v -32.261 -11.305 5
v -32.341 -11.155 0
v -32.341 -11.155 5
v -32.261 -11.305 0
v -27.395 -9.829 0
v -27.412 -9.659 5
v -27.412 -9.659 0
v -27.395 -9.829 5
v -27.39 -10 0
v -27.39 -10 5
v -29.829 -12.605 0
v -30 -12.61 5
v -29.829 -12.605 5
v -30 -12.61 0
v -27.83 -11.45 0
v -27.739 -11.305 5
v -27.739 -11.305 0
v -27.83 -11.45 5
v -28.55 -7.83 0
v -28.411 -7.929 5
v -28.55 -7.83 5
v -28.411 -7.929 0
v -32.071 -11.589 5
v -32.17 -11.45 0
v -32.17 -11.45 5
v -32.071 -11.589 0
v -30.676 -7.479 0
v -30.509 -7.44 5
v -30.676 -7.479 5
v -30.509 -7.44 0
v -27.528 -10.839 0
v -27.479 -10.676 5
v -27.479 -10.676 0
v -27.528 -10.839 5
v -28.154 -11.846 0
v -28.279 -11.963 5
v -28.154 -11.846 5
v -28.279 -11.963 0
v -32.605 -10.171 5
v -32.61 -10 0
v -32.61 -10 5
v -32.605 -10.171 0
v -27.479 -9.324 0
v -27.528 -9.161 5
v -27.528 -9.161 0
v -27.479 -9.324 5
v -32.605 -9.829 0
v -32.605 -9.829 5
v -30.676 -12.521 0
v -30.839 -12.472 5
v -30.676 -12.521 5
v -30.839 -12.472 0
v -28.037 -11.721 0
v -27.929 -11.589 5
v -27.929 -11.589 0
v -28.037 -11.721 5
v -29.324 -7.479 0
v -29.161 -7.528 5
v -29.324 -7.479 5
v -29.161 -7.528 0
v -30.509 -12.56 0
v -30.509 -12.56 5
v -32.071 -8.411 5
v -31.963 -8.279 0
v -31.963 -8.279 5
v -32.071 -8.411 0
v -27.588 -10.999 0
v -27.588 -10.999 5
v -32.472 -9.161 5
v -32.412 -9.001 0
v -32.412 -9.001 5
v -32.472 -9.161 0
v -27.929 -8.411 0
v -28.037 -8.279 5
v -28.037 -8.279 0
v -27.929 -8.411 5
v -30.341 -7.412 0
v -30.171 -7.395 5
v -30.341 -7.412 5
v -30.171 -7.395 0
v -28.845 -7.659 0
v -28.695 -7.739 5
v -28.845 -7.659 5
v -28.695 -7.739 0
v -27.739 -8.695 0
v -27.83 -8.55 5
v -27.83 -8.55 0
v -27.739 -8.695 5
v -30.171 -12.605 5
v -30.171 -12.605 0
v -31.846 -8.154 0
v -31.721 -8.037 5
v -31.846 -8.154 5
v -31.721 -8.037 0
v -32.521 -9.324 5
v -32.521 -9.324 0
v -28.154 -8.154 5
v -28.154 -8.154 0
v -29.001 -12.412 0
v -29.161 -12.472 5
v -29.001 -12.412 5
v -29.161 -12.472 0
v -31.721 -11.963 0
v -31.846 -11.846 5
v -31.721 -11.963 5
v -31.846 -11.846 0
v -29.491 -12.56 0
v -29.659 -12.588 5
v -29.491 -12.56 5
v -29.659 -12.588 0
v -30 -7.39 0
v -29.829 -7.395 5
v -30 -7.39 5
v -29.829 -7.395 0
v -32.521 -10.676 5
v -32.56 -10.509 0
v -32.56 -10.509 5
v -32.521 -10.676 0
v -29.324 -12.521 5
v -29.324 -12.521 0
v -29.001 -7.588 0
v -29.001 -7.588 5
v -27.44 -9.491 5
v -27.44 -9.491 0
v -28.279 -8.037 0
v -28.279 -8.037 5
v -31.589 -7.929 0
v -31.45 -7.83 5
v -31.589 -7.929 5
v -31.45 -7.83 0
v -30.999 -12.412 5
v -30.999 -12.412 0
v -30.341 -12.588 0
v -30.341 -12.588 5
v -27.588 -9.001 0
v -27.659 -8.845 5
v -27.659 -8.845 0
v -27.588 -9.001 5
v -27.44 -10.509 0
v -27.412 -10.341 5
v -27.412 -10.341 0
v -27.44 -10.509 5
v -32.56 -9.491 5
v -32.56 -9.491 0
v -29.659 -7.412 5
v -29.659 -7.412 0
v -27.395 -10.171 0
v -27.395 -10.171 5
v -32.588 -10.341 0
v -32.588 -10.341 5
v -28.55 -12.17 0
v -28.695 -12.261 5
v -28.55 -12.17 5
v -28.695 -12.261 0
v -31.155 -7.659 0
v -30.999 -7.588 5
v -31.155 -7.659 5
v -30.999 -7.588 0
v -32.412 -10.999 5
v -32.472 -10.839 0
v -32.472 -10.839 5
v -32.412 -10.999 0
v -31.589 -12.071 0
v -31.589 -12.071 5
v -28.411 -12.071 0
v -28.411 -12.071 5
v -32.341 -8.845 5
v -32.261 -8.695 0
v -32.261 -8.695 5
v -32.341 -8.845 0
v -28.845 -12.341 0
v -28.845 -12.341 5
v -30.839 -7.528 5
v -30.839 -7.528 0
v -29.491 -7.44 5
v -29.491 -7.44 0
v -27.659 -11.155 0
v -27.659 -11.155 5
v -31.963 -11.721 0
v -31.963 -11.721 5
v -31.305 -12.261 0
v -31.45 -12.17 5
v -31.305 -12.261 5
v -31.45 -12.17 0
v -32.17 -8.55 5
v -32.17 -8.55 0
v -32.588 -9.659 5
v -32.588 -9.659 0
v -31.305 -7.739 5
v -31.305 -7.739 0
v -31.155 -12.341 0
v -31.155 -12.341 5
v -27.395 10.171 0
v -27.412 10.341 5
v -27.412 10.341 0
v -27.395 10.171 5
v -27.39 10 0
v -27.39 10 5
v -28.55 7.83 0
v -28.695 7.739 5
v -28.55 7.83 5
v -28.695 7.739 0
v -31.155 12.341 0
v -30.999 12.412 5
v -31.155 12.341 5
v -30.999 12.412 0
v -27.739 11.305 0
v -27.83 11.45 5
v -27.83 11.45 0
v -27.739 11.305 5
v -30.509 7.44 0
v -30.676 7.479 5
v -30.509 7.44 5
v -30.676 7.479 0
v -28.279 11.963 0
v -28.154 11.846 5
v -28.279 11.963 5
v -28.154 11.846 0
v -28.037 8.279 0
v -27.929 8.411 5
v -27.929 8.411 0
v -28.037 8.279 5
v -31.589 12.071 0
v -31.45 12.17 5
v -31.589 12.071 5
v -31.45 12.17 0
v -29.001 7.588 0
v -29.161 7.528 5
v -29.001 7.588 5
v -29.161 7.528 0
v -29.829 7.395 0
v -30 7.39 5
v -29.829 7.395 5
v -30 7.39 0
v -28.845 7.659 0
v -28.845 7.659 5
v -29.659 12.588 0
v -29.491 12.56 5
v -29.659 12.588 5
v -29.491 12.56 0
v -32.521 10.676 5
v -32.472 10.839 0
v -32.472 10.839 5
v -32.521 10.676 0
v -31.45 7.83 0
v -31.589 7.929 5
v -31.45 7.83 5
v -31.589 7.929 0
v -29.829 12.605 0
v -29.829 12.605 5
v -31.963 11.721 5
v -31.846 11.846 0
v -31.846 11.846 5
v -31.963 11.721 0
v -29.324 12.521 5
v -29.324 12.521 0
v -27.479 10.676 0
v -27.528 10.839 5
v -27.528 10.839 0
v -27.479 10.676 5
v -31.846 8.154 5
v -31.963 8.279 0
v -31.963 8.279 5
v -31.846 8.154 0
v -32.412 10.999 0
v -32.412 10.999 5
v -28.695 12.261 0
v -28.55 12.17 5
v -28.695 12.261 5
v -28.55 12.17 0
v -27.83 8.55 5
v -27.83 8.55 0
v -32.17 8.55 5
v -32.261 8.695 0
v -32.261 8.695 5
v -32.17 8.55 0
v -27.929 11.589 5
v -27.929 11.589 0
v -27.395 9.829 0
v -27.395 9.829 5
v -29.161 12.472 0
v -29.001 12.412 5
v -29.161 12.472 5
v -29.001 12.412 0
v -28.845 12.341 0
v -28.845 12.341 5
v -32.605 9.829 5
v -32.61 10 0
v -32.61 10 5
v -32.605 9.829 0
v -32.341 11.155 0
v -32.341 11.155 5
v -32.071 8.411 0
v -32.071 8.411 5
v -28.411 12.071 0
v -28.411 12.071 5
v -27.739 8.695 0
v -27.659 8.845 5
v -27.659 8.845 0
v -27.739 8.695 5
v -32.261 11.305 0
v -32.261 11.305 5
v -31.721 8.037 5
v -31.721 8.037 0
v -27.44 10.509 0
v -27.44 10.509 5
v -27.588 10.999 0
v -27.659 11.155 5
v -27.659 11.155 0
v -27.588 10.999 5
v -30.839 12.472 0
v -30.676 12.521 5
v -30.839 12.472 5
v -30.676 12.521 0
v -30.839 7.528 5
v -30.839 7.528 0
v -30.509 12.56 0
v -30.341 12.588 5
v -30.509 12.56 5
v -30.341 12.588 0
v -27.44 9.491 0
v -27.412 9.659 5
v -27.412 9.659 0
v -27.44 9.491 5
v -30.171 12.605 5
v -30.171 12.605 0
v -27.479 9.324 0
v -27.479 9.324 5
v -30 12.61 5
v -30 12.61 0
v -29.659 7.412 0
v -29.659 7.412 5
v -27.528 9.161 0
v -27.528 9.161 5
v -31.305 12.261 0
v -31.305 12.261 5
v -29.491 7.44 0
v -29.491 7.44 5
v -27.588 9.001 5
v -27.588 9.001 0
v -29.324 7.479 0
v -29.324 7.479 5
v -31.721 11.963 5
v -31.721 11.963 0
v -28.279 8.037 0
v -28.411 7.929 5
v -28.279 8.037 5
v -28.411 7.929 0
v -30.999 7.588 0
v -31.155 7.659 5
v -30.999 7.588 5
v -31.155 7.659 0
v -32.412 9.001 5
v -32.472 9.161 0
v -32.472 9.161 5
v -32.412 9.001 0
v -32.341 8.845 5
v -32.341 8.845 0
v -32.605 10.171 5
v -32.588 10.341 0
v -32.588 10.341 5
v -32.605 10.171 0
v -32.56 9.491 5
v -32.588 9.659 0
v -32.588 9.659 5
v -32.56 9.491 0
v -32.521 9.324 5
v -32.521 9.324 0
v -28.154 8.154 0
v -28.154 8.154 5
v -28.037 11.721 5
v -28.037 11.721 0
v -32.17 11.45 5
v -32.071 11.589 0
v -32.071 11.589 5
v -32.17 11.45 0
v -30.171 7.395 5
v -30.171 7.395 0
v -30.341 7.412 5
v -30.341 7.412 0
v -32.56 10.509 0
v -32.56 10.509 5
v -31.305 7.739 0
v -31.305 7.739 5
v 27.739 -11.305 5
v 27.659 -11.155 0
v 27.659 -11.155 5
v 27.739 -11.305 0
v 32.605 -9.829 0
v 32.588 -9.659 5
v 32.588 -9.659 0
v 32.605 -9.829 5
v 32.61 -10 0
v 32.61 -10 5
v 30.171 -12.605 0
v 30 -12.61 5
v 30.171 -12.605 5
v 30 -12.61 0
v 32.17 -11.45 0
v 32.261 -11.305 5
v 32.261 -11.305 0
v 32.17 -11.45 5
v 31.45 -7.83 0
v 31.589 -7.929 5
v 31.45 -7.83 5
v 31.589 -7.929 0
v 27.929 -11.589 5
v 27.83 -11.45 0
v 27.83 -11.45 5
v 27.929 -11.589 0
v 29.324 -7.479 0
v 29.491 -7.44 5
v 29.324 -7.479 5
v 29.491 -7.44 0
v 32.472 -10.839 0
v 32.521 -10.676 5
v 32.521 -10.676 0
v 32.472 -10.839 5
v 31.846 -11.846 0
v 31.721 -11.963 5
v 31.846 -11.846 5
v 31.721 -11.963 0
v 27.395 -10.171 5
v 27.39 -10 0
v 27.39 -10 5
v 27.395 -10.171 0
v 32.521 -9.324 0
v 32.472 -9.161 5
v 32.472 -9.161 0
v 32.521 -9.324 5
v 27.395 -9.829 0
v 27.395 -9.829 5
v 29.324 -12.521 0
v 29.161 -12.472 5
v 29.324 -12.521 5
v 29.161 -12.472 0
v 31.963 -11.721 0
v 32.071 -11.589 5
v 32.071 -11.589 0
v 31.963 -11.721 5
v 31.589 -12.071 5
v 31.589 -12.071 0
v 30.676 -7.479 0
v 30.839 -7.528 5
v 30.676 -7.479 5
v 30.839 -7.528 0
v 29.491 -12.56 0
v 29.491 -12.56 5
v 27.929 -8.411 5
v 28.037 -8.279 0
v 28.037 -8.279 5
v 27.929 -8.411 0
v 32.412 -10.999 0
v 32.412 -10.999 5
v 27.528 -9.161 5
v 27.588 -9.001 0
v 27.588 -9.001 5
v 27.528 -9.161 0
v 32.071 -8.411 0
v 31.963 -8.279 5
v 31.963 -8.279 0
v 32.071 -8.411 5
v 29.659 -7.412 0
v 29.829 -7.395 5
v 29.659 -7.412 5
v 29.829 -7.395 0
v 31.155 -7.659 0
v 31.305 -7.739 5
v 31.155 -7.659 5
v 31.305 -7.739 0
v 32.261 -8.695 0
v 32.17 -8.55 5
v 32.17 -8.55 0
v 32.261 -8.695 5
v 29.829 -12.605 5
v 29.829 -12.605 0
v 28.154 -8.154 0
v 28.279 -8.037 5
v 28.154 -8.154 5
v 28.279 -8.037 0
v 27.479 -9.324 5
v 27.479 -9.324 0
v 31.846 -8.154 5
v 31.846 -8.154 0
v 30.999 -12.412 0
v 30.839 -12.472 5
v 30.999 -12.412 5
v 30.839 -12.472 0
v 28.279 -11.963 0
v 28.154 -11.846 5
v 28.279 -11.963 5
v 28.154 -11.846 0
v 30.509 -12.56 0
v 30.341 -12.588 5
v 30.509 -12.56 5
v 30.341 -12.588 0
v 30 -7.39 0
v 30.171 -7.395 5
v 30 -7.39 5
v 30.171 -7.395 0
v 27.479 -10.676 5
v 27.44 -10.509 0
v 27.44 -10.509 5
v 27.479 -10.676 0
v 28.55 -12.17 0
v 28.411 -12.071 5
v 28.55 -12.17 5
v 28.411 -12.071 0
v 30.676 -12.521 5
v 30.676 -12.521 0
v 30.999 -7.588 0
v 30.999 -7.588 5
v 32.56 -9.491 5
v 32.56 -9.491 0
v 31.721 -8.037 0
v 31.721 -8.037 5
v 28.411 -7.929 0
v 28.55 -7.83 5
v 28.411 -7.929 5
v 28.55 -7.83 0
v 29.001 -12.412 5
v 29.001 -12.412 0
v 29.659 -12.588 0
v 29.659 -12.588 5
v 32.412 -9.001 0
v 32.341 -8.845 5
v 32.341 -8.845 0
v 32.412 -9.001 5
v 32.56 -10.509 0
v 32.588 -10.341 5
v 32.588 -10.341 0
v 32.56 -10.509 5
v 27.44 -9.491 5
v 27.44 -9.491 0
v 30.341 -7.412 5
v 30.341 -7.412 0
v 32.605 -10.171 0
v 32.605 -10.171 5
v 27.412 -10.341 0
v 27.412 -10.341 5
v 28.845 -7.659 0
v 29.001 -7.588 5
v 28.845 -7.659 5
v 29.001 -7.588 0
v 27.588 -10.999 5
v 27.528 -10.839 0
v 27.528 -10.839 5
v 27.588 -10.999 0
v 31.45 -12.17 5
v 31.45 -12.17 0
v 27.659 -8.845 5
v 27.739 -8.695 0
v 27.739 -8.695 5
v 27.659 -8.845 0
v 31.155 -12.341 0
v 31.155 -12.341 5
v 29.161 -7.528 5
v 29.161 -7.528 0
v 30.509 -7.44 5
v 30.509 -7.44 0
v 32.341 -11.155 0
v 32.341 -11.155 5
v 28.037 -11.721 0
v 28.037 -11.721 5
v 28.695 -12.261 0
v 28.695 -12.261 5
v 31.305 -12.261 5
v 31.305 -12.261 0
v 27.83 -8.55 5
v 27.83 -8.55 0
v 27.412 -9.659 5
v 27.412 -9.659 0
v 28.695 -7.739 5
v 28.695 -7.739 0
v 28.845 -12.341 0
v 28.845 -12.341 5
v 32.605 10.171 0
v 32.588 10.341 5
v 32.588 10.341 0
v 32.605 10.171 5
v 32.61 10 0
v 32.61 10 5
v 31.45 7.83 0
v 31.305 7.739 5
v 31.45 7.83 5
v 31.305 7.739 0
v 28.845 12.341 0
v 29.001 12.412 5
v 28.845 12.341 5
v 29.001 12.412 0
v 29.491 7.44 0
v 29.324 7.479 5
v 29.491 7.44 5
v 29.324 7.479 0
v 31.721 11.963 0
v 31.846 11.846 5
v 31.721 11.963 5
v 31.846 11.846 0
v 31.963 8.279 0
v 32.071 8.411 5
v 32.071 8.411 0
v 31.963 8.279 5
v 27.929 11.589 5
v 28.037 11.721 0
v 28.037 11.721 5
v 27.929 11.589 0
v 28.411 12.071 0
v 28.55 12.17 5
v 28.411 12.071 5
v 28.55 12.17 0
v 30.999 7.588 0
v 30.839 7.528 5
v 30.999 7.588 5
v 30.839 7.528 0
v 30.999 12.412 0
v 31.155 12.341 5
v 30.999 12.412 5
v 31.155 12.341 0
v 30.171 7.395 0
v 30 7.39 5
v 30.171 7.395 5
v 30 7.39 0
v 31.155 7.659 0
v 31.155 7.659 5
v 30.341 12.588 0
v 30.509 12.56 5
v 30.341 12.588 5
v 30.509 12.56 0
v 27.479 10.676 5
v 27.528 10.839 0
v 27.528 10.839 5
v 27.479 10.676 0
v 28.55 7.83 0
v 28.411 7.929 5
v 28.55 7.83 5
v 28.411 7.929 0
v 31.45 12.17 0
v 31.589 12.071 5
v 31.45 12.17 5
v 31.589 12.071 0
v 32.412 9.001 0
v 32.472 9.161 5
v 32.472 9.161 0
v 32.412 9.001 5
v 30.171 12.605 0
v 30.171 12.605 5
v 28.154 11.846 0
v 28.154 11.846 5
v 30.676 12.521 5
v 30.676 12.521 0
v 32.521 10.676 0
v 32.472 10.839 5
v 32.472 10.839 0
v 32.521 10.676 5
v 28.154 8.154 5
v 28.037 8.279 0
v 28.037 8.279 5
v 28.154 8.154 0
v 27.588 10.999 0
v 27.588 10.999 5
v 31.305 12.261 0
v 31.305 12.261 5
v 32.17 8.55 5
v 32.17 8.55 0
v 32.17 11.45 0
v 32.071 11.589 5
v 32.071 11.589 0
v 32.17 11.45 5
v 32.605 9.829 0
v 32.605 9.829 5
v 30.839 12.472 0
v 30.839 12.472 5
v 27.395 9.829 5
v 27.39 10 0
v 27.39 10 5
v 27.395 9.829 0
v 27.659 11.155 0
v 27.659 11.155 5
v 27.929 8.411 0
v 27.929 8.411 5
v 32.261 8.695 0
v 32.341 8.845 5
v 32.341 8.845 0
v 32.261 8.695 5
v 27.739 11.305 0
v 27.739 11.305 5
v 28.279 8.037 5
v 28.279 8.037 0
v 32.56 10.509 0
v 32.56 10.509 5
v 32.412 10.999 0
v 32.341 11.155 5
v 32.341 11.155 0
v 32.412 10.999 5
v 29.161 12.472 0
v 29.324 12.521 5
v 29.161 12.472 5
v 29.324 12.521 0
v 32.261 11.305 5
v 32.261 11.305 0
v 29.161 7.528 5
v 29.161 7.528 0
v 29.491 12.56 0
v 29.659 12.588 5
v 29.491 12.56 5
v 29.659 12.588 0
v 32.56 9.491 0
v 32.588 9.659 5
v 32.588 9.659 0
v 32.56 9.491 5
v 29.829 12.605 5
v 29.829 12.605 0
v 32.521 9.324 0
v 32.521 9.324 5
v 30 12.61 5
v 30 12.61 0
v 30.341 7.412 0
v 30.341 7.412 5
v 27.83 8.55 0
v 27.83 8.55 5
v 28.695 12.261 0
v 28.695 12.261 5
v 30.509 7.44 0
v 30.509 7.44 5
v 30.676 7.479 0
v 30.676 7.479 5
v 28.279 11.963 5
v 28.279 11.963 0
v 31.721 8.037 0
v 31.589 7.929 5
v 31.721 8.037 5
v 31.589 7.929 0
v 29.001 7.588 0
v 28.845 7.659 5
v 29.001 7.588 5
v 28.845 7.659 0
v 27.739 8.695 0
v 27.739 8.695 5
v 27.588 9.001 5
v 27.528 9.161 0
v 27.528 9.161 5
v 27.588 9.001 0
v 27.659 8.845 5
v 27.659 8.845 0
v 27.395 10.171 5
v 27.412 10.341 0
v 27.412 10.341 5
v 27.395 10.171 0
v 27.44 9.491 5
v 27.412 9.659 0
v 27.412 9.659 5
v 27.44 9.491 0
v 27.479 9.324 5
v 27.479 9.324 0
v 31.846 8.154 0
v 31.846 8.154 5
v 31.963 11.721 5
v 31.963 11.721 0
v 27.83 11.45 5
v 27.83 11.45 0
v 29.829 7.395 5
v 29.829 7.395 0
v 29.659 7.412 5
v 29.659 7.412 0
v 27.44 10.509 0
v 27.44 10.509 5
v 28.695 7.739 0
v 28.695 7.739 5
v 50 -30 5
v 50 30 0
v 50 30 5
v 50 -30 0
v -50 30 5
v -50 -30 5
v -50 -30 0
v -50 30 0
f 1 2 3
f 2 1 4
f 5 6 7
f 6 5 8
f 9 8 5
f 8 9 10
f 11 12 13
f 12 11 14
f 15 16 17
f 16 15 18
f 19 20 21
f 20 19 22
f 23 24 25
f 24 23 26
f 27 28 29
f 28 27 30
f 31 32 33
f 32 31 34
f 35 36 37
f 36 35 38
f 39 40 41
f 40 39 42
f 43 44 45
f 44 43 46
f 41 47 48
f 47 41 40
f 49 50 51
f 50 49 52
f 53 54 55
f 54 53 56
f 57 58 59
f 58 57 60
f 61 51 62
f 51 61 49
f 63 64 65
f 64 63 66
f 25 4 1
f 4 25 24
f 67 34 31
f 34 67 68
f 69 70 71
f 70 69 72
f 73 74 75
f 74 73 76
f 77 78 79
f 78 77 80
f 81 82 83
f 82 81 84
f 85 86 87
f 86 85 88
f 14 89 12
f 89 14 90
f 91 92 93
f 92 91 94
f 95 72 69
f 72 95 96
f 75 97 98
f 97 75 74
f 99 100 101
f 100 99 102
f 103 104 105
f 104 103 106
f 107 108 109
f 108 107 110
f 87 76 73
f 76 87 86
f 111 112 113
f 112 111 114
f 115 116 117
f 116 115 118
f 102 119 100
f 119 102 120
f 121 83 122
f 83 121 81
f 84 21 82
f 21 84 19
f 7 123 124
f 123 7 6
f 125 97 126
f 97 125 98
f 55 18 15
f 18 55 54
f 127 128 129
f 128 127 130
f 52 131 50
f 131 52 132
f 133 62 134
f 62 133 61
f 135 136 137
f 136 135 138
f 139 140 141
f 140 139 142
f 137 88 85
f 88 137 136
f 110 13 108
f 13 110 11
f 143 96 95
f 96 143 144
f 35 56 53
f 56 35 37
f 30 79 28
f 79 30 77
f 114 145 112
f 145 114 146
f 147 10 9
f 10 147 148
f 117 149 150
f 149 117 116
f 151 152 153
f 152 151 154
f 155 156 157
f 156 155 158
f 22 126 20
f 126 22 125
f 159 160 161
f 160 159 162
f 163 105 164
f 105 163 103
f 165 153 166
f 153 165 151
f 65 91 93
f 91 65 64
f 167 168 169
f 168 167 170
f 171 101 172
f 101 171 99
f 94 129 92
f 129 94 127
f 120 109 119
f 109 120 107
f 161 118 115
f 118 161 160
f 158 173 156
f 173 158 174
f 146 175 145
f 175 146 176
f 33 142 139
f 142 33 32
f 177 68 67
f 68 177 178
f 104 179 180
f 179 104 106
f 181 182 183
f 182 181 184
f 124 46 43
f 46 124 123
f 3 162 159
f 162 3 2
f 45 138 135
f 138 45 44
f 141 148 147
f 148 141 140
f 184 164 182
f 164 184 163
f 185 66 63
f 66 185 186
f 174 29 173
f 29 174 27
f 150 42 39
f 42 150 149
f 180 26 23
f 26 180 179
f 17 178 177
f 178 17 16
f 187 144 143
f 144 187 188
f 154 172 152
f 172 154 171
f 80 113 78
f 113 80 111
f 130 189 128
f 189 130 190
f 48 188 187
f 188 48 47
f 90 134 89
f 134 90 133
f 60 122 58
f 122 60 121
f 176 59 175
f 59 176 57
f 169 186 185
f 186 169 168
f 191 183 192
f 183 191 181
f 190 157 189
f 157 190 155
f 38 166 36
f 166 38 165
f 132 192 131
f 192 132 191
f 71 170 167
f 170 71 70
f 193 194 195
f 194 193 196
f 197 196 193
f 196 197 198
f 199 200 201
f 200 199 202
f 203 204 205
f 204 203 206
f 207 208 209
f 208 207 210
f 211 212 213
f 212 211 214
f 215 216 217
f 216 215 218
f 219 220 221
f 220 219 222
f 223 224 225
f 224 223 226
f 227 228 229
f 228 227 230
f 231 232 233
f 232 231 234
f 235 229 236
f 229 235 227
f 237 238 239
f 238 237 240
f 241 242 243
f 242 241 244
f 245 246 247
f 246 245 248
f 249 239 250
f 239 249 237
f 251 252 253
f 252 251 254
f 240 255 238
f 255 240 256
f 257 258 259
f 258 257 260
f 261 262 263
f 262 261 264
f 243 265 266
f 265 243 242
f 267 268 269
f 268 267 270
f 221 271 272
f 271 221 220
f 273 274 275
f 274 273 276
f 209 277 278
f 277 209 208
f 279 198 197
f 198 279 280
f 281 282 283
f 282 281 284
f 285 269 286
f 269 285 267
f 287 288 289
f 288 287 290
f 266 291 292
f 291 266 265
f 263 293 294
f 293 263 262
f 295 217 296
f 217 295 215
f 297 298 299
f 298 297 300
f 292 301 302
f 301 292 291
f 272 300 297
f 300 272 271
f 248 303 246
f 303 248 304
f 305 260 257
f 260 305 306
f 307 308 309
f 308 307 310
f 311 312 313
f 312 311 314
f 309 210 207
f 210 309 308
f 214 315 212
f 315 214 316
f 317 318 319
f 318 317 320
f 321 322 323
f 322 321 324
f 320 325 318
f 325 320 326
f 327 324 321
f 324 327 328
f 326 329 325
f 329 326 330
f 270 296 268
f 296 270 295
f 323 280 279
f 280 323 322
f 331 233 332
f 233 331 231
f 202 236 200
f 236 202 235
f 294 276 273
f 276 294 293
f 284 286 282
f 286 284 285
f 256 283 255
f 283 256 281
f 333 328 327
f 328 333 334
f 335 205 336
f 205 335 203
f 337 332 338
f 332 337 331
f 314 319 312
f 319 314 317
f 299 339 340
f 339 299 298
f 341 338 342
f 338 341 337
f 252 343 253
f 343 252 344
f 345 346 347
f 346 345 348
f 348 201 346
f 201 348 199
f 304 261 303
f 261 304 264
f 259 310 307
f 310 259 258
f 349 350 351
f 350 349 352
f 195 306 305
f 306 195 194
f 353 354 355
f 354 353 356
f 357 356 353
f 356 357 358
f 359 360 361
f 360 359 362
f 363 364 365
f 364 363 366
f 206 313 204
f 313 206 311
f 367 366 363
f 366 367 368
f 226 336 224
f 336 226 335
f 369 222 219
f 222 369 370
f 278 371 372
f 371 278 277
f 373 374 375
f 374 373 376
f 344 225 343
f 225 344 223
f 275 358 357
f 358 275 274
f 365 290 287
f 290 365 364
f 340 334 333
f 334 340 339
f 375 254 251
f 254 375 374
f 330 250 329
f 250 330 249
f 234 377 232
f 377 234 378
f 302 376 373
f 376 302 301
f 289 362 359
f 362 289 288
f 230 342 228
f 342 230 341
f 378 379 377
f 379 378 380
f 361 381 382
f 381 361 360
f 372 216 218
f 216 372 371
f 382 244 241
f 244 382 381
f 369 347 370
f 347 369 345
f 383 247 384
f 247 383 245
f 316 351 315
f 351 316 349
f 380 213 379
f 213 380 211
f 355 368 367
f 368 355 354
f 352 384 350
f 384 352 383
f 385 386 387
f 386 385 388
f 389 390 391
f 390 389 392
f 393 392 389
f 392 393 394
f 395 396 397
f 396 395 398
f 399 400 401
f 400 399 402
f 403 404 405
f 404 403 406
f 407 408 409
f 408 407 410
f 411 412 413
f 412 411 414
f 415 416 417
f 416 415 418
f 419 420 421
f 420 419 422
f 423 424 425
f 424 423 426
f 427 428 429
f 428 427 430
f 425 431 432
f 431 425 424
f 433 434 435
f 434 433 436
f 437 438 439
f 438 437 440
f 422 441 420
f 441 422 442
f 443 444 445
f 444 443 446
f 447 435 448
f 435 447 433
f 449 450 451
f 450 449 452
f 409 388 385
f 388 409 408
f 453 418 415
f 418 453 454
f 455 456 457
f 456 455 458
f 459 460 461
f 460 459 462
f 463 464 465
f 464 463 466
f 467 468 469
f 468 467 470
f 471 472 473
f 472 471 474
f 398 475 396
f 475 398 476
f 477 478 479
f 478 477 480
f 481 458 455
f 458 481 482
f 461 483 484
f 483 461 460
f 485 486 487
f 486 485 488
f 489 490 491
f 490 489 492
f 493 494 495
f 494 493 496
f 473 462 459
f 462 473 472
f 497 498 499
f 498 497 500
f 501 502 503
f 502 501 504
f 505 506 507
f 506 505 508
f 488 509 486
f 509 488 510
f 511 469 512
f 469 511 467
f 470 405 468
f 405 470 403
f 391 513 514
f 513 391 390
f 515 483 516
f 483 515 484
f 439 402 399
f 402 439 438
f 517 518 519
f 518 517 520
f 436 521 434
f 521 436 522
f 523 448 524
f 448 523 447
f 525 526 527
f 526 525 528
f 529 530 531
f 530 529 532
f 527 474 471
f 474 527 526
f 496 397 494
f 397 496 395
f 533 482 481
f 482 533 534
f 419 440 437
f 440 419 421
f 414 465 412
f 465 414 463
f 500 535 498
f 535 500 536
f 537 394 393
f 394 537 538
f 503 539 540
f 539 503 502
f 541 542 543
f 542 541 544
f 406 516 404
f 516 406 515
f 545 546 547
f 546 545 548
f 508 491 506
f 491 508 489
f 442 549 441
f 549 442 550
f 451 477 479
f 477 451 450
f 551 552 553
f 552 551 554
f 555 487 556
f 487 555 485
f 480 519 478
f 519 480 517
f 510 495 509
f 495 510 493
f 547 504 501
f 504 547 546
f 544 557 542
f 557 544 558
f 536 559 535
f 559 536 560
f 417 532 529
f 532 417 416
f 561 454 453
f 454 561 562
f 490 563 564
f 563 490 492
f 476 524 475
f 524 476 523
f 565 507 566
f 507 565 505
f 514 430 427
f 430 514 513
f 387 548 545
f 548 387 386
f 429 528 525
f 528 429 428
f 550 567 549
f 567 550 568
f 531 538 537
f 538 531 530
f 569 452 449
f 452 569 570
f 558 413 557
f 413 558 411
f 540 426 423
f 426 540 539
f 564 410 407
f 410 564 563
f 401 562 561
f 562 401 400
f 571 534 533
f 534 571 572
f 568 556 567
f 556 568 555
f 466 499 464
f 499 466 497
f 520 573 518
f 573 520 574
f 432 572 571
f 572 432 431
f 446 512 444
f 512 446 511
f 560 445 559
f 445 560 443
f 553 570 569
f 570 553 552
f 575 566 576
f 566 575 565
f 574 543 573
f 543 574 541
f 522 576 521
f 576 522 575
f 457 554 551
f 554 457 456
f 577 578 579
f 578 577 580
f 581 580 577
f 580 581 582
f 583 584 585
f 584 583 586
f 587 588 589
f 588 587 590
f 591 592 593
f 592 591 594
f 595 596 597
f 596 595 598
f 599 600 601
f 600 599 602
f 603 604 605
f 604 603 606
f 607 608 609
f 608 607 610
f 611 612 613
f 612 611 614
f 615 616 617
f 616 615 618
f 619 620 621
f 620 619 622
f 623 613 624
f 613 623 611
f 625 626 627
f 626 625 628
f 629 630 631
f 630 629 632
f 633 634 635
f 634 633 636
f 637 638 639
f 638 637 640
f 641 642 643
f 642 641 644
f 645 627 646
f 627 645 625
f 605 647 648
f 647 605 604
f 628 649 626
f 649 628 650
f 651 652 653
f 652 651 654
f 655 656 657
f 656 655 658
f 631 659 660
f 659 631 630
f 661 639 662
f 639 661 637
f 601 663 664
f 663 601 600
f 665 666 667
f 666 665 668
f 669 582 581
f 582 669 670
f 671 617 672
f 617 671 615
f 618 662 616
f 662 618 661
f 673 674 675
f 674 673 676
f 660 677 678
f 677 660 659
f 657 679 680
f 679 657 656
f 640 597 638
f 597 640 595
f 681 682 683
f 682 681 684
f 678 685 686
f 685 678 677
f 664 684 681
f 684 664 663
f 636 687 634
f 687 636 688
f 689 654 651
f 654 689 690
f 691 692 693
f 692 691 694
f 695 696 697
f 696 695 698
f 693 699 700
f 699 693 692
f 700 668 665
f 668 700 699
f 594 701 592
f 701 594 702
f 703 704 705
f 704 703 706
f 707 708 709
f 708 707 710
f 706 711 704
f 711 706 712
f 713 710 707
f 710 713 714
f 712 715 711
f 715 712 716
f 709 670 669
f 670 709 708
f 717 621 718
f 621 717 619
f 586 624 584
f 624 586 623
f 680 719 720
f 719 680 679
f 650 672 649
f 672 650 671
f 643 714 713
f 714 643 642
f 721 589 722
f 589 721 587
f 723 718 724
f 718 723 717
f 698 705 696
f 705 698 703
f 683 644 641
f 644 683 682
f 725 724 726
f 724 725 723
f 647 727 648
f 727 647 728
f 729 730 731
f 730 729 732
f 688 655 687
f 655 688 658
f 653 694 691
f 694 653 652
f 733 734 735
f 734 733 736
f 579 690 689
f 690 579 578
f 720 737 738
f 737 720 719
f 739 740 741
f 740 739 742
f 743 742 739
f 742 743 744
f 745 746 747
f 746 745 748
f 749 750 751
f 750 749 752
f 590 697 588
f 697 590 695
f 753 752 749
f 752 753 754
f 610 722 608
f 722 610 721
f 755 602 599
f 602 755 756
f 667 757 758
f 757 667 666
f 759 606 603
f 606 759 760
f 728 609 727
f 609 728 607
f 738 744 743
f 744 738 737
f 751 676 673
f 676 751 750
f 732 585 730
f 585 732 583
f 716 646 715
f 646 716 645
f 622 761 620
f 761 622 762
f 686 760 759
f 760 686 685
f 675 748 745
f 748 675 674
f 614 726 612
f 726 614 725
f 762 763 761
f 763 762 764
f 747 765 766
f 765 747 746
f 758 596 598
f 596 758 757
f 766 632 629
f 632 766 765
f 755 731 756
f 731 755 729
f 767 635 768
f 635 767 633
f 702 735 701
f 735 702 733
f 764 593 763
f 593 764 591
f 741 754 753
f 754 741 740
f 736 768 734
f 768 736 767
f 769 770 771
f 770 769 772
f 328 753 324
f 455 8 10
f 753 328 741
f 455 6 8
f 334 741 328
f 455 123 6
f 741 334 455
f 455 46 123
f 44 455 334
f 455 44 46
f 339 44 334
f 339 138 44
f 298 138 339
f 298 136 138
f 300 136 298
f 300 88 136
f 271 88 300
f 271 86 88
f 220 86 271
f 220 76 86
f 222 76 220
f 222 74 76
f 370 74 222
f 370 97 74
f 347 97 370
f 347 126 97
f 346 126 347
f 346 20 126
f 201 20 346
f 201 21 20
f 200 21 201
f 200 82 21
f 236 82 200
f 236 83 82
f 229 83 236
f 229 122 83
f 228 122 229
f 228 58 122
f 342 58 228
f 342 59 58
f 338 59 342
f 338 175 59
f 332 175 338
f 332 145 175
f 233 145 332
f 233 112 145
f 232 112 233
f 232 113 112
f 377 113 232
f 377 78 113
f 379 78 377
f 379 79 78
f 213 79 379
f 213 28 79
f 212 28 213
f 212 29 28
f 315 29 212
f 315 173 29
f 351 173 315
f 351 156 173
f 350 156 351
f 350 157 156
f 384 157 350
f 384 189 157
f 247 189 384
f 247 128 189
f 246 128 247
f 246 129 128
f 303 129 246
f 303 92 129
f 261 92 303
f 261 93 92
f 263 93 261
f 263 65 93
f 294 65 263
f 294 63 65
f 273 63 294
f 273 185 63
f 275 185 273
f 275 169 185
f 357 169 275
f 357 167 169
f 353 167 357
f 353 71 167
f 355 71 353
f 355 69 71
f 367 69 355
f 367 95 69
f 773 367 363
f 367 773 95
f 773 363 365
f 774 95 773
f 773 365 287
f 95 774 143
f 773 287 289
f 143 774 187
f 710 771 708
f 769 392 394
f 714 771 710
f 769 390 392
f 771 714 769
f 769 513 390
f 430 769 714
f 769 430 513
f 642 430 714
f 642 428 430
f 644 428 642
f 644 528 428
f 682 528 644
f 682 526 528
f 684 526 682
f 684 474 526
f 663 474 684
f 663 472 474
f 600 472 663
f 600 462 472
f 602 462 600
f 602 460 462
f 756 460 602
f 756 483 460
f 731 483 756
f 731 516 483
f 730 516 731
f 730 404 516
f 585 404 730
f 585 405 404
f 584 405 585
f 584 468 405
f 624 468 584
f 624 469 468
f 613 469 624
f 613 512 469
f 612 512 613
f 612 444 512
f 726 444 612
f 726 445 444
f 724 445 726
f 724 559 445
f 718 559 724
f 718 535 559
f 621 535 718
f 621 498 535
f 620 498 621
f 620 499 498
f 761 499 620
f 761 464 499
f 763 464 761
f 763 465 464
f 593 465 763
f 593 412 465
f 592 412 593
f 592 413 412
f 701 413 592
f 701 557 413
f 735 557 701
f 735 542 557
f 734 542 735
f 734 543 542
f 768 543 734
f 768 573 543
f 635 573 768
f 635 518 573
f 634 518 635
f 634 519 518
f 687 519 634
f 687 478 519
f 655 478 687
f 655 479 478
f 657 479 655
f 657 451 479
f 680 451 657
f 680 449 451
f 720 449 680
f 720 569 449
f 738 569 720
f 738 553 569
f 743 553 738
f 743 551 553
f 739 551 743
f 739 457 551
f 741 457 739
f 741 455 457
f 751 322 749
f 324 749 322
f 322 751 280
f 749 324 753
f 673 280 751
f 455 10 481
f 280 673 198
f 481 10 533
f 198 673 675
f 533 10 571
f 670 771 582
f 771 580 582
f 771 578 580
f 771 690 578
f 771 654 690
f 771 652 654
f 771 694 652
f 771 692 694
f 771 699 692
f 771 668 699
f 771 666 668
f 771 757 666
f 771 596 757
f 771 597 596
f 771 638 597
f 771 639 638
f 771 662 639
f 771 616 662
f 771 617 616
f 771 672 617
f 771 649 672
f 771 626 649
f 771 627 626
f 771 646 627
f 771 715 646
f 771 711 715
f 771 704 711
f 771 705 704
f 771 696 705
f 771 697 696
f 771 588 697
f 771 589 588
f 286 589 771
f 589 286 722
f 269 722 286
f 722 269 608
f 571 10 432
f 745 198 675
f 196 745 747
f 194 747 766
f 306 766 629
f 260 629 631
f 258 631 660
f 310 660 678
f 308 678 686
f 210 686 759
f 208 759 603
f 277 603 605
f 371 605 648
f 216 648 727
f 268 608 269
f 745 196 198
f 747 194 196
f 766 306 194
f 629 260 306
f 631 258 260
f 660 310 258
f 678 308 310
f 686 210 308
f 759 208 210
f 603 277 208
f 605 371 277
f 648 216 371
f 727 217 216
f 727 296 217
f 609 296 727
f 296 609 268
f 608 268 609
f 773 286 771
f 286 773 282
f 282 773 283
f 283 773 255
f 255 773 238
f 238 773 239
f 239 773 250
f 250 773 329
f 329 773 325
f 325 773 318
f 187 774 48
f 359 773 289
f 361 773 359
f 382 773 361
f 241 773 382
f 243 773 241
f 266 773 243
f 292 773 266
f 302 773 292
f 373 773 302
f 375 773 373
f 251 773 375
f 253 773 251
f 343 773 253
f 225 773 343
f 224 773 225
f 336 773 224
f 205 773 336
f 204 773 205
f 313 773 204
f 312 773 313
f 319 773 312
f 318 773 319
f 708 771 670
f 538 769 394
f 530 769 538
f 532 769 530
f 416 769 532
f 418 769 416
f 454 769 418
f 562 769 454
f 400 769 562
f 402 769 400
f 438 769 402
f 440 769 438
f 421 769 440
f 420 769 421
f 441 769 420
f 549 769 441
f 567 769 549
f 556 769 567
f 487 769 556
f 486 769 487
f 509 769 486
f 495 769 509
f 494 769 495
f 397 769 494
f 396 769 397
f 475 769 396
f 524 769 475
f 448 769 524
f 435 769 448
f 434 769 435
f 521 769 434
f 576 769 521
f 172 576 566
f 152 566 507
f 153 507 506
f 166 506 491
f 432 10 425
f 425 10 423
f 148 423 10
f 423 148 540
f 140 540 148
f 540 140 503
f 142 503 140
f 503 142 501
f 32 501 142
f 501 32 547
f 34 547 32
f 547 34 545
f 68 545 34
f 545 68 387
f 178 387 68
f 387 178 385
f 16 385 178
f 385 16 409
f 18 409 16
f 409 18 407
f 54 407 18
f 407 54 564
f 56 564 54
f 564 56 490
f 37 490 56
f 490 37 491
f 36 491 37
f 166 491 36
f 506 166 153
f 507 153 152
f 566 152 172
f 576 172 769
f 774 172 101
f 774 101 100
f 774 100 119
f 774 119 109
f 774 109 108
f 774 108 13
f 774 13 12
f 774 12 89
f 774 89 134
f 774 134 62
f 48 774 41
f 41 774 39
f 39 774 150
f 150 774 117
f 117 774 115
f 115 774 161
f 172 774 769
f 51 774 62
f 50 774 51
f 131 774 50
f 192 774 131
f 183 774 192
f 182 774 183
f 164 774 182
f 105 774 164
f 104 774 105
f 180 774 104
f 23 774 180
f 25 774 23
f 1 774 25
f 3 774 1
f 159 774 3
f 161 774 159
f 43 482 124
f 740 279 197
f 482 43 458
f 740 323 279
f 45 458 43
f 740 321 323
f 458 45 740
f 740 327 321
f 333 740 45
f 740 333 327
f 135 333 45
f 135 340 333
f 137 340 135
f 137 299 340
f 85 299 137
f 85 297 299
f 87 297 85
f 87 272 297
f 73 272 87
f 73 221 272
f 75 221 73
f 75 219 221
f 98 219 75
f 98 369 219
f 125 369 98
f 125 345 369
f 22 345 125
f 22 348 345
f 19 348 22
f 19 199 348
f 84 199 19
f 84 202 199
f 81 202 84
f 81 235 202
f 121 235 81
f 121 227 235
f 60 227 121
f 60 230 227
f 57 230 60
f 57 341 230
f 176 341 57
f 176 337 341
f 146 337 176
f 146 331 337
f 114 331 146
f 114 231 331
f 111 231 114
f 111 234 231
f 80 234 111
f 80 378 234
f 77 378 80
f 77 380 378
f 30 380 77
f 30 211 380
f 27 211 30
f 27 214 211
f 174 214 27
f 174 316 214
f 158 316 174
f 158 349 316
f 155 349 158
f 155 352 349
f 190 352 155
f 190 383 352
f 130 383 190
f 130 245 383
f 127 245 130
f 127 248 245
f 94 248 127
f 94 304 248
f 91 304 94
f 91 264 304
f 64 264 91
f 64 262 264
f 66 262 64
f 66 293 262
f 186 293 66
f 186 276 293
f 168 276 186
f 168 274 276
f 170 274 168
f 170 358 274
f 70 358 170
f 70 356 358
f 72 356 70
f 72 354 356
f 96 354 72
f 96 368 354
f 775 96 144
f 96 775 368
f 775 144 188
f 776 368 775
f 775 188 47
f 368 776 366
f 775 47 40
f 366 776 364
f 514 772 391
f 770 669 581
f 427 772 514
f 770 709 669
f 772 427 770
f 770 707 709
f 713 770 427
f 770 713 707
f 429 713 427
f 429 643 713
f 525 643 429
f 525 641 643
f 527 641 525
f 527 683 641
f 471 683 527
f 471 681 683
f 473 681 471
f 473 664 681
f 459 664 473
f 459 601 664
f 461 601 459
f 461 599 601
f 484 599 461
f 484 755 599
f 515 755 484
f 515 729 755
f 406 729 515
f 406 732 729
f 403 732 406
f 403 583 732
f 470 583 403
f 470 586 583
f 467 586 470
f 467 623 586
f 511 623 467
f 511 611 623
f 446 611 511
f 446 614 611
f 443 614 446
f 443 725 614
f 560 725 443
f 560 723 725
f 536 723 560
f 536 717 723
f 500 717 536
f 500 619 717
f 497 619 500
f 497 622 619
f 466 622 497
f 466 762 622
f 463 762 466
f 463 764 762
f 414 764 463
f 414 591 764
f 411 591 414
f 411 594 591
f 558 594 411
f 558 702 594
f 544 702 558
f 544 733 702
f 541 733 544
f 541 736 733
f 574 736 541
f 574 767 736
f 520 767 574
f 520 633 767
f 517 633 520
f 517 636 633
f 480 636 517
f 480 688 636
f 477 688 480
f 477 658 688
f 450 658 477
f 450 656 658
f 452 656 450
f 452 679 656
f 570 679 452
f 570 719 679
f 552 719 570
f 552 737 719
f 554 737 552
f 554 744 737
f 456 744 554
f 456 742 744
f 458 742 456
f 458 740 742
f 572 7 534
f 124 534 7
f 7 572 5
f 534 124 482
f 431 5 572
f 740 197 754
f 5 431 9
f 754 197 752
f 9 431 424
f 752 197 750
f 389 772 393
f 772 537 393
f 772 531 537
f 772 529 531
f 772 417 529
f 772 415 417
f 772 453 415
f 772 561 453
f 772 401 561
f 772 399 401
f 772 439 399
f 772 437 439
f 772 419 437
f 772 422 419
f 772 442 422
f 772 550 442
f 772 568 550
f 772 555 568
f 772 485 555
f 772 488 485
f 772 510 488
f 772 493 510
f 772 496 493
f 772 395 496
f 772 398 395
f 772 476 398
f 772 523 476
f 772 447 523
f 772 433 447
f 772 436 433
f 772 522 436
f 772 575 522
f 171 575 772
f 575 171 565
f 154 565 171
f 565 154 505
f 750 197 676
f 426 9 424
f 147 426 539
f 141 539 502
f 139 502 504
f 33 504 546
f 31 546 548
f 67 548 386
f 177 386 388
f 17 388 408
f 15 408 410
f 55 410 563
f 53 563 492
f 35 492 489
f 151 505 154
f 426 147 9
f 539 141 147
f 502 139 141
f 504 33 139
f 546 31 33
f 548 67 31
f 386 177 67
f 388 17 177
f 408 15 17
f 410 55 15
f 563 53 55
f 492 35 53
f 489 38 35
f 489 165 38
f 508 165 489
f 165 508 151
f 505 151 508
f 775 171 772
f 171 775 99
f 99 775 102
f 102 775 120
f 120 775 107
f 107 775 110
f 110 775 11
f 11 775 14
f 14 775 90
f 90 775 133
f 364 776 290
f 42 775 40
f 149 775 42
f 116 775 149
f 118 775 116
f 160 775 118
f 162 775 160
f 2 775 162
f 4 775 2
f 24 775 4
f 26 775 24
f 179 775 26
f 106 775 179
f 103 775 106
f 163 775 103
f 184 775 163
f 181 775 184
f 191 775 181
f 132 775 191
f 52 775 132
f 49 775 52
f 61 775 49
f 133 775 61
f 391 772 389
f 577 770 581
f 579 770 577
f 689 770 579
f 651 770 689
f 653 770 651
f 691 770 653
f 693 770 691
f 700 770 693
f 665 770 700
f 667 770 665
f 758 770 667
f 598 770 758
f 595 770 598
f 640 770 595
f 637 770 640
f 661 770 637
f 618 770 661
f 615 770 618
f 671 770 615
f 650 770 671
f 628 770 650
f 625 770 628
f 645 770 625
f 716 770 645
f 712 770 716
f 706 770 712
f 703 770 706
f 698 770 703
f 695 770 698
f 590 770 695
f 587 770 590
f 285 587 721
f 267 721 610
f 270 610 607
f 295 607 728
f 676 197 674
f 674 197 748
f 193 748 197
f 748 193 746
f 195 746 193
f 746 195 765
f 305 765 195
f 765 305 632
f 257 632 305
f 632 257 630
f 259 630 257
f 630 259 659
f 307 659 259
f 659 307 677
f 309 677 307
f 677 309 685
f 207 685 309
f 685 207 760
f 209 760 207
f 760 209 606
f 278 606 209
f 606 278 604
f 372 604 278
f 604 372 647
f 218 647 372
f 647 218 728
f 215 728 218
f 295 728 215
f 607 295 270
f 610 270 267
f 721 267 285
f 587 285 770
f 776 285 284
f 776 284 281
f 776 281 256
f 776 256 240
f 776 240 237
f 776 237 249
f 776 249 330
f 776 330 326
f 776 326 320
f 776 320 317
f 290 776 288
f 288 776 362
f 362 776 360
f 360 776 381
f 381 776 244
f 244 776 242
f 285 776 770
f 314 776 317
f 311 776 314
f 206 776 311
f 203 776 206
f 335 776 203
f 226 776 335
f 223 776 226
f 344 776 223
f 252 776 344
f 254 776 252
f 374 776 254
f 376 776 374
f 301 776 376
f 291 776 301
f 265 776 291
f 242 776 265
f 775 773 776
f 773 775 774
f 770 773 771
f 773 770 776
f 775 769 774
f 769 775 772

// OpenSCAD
// Generated by PromptCAD Studio
$fn = 96;

difference() {
  union() {
    translate([-50, -30, 0]) cube([100, 60, 5]);
  }
  union() {
    translate([-30, -10, -1]) rotate([0, 0, 0]) cylinder(d=5.22065934576, h=7);
    translate([-30, 10, -1]) rotate([0, 0, 0]) cylinder(d=5.22065934576, h=7);
    translate([30, -10, -1]) rotate([0, 0, 0]) cylinder(d=5.22065934576, h=7);
    translate([30, 10, -1]) rotate([0, 0, 0]) cylinder(d=5.22065934576, h=7);
  }
}
